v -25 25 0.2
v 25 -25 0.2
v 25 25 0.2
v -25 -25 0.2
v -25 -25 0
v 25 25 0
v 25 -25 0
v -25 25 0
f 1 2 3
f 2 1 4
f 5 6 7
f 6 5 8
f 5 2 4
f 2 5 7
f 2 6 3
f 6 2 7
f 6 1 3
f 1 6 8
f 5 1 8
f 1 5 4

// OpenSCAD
cube_size=50;
bed_offset=90;

translate([-cube_size/2,-cube_size/2,0]) {
    cube([cube_size,cube_size,.2]);
    
    /*
    translate([-bed_offset+cube_size/2,bed_offset-cube_size/2,0]) cube([cube_size,cube_size,.2]);
    translate([-bed_offset+cube_size/2,-bed_offset+cube_size/2,0]) cube([cube_size,cube_size,.2]);
    translate([bed_offset-cube_size/2,bed_offset-cube_size/2,0]) cube([cube_size,cube_size,.2]);
    translate([bed_offset-cube_size/2,-bed_offset+cube_size/2,0]) cube([cube_size,cube_size,.2]);

    translate([0,bed_offset-cube_size/2,0]) cube([cube_size,cube_size,.2]);
    translate([0,-bed_offset+cube_size/2,0]) cube([cube_size,cube_size,.2]);
    translate([-bed_offset+cube_size/2,0,0]) cube([cube_size,cube_size,.2]);
    translate([bed_offset-cube_size/2,0,0]) cube([cube_size,cube_size,.2]);

    translate([(-bed_offset+cube_size/2)/2,(bed_offset-cube_size/2)/2,0]) cube([cube_size,cube_size,.2]);
    translate([(-bed_offset+cube_size/2)/2,(-bed_offset+cube_size/2)/2,0]) cube([cube_size,cube_size,.2]);
    translate([(bed_offset-cube_size/2)/2,(bed_offset-cube_size/2)/2,0]) cube([cube_size,cube_size,.2]);
    translate([(bed_offset-cube_size/2)/2,(-bed_offset+cube_size/2)/2,0]) cube([cube_size,cube_size,.2]);
    //*/
}
